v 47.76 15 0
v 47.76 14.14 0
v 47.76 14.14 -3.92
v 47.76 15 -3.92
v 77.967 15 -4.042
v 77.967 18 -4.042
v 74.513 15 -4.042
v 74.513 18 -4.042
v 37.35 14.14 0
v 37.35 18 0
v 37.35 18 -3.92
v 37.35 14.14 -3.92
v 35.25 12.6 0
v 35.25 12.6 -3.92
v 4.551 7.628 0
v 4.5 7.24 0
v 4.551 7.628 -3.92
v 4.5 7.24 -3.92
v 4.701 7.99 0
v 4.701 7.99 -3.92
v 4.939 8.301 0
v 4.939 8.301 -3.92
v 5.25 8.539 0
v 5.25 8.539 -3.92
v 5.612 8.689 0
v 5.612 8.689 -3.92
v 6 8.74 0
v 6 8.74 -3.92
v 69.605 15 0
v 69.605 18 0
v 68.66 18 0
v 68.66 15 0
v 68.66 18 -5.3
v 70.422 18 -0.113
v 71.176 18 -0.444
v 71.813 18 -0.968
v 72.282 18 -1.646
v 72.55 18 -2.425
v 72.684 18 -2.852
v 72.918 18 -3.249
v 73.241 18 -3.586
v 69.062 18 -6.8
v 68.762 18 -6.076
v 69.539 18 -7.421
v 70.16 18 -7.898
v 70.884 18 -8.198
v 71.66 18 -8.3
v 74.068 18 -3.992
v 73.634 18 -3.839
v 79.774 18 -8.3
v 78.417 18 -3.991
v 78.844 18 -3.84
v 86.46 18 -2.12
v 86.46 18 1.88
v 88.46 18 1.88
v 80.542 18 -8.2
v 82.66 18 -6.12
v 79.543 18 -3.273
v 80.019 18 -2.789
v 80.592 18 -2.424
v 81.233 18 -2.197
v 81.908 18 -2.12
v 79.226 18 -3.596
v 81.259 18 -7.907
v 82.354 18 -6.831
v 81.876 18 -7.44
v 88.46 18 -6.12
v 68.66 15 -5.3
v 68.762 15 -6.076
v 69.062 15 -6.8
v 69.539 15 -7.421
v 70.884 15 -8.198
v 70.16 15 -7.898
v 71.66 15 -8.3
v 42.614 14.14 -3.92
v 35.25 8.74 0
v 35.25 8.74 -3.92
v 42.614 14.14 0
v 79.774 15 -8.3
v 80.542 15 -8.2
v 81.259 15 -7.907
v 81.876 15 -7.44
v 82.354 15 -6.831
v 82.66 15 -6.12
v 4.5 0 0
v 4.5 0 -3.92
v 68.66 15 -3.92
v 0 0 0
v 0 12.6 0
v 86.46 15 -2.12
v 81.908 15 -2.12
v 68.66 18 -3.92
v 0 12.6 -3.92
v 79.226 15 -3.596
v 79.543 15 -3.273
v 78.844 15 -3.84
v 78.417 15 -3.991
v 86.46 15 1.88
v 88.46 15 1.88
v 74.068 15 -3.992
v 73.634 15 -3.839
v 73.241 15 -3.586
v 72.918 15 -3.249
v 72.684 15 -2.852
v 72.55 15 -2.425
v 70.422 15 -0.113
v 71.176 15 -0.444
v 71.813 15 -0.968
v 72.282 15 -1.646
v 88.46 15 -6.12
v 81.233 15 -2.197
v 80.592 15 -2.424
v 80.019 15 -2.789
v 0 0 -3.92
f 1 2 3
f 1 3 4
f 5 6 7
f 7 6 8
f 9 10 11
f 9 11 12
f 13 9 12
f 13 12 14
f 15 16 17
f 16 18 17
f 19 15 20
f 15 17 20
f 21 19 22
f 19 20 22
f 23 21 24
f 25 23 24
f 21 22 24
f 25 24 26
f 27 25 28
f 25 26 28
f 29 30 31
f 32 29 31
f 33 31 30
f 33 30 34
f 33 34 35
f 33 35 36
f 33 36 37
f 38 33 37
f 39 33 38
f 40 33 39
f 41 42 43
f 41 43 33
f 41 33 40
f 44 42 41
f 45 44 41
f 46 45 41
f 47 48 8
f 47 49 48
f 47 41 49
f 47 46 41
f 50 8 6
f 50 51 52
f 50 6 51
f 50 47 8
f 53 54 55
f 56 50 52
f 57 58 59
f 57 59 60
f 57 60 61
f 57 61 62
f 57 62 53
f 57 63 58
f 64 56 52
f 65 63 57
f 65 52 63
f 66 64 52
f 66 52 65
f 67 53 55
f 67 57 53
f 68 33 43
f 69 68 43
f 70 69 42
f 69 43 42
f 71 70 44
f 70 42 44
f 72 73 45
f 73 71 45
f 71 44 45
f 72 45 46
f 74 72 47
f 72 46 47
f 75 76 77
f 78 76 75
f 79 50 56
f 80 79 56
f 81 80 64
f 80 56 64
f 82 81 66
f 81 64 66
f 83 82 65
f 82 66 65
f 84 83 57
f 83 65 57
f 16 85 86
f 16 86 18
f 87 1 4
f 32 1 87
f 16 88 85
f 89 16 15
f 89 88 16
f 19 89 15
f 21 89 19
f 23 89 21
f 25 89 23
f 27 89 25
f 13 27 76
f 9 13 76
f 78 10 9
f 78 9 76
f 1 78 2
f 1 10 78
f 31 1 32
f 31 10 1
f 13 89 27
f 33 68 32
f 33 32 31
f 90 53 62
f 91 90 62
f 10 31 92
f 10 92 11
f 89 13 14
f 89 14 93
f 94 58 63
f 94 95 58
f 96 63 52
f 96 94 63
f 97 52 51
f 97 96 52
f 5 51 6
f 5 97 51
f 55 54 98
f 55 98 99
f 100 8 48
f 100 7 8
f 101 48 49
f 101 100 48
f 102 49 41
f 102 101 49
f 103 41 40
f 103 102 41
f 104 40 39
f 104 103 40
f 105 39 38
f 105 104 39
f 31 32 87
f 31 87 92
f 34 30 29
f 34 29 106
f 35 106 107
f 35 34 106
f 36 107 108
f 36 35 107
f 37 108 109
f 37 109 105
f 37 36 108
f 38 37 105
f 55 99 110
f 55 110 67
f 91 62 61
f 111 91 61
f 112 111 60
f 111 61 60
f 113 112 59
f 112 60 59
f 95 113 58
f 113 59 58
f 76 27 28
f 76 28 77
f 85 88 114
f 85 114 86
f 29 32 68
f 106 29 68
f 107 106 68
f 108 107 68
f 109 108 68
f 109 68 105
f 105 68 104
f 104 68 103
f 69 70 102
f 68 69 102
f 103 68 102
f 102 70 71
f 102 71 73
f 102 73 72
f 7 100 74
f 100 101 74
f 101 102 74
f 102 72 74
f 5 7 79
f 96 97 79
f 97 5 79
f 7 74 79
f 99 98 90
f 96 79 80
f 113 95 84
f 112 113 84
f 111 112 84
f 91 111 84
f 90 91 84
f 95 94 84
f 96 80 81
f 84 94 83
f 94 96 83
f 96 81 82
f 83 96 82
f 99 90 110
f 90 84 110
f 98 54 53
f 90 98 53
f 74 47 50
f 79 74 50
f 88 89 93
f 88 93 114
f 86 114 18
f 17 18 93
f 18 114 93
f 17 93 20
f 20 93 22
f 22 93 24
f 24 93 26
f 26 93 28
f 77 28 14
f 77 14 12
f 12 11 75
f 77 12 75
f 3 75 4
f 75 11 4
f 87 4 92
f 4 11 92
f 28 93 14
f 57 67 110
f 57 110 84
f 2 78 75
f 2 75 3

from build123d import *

# Parameters (mm, degrees)
F0_W        = 4.5
F0_H        = 8.74
F0_W_2      = 20.9
F0_H_2      = 3
F1_DEPTH    = 3.92
F0_W_3      = 19.8
F2_DEPTH    = 8.3
F3_DEPTH    = 1.88
F4_W        = 5.8
F4_H        = 2.18
F5_DEPTH    = 25
F6_T1_DEPTH = 18
F6_T3_DEPTH = 17.4287906631
F6_T5_DEPTH = 16.9987425023
F7_R        = 2
F8_R        = 1.5


# Not quite as in the source:
# - a fillet or chamfer that OpenCascade refuses, or shapes differently, is made with other operations: its cross-section is extruded or revolved along the edge and cut away or added
# - a feature names something its author has since deleted; it is built from what else it names


with BuildPart() as f1:
    # F0 (on Top) → F1 (new body)
    with BuildSketch(Plane.XY):
        with Locations((2.25, 4.37)):
            Rectangle(F0_W, F0_H)
        Polygon((0, 12.6), (0, 8.74), (4.5, 8.74), (35.25, 8.74), (35.25, 12.6), align=None)
        Polygon((35.25, 12.6), (35.25, 8.74), (42.6136363636, 14.14), (37.35, 14.14), align=None)
        Polygon((37.35, 14.14), (42.6136363636, 14.14), (47.76, 14.14), (47.76, 15), (47.76, 18), (37.35, 18), align=None)
        with Locations((58.21, 16.5)):
            Rectangle(F0_W_2, F0_H_2)
    extrude(amount=-F1_DEPTH)

    # F8
    f8_edges = [f1.edges().sort_by_distance(p)[0] for p in [
        (4.5, 8.74, -1.96),
    ]]
    fillet(f8_edges, radius=F8_R)


with BuildPart() as f2:
    # F0 (on Top) → F2 (new body)
    with BuildSketch(Plane.XY):
        with Locations((78.56, 16.5)):
            Rectangle(F0_W_3, F0_H_2)
    extrude(amount=-F2_DEPTH)

    # F0 (on Top) → F3 (join)
    with BuildSketch(Plane.XY):
        with Locations((78.56, 16.5)):
            Rectangle(F0_W_3, F0_H_2)
    extrude(amount=F3_DEPTH)

    # F4 (on face) → F5 (cut)
    with BuildSketch(Plane(origin=(0, 18, 0), x_dir=(-1, 0, 0), z_dir=(0, 1, 0))):
        with Locations((-85.56, -7.21)):
            Rectangle(F4_W, F4_H)
        Polygon((-68.66, 1.88), (-86.46, 1.88), (-86.46, -2.12), (-82.66, -2.12), (-79.1077613831, -2.12), (-79.1077613831, -4.0423134342), (-72.6052895188, -4.0423134342), (-72.6052895188, 0), (-68.66, 0), align=None)
    extrude(amount=-F5_DEPTH, mode=Mode.SUBTRACT)

    # F6: fillet of radius 3 on 4 edges, made by hand

    # F6_s2 → F6_t1 (cut)
    with BuildSketch(Plane.XZ.offset(-25.5)):
        with BuildLine():
            ThreePointArc((68.66, -5.3), (69.5386796564, -7.4213203436), (71.66, -8.3))
            Line((71.66, -8.3), (68.66, -8.3))
            Line((68.66, -8.3), (68.66, -5.3))
        make_face()
        with BuildLine():
            ThreePointArc((69.6052895188, 0), (71.7266098624, -0.8786796564), (72.6052895188, -3))
            Line((72.6052895188, -3), (72.6052895188, 0))
            Line((72.6052895188, 0), (69.6052895188, 0))
        make_face()
    extrude(amount=F6_T1_DEPTH, mode=Mode.SUBTRACT)

    # F6_s4 → F6_t3 (cut)
    with BuildSketch(Plane.XZ.offset(-25.2143953316)):
        with BuildLine():
            ThreePointArc((79.7742418674, -8.3), (81.5825559994, -7.6937418407), (82.66, -6.12))
            Line((82.66, -6.12), (82.66, -8.3))
            Line((82.66, -8.3), (79.7742418674, -8.3))
        make_face()
    extrude(amount=F6_T3_DEPTH, mode=Mode.SUBTRACT)

    # F6_s6 → F6_t5 (cut)
    with BuildSketch(Plane.XZ.offset(-24.9993712512)):
        with BuildLine():
            ThreePointArc((81.9075098835, -2.12), (80.2094315133, -2.6468380868), (79.1077613831, -4.0423134342))
            Line((79.1077613831, -4.0423134342), (79.1077613831, -2.12))
            Line((79.1077613831, -2.12), (81.9075098835, -2.12))
        make_face()
    extrude(amount=F6_T5_DEPTH, mode=Mode.SUBTRACT)

    # F7
    f7_edges = [f2.edges().sort_by_distance(p)[0] for p in [
        (72.60529, 16.5, -4.042313),
        (79.107761, 16.5, -4.042313),
    ]]
    fillet(f7_edges, radius=F7_R)


solid = Compound([f1.part, f2.part])
